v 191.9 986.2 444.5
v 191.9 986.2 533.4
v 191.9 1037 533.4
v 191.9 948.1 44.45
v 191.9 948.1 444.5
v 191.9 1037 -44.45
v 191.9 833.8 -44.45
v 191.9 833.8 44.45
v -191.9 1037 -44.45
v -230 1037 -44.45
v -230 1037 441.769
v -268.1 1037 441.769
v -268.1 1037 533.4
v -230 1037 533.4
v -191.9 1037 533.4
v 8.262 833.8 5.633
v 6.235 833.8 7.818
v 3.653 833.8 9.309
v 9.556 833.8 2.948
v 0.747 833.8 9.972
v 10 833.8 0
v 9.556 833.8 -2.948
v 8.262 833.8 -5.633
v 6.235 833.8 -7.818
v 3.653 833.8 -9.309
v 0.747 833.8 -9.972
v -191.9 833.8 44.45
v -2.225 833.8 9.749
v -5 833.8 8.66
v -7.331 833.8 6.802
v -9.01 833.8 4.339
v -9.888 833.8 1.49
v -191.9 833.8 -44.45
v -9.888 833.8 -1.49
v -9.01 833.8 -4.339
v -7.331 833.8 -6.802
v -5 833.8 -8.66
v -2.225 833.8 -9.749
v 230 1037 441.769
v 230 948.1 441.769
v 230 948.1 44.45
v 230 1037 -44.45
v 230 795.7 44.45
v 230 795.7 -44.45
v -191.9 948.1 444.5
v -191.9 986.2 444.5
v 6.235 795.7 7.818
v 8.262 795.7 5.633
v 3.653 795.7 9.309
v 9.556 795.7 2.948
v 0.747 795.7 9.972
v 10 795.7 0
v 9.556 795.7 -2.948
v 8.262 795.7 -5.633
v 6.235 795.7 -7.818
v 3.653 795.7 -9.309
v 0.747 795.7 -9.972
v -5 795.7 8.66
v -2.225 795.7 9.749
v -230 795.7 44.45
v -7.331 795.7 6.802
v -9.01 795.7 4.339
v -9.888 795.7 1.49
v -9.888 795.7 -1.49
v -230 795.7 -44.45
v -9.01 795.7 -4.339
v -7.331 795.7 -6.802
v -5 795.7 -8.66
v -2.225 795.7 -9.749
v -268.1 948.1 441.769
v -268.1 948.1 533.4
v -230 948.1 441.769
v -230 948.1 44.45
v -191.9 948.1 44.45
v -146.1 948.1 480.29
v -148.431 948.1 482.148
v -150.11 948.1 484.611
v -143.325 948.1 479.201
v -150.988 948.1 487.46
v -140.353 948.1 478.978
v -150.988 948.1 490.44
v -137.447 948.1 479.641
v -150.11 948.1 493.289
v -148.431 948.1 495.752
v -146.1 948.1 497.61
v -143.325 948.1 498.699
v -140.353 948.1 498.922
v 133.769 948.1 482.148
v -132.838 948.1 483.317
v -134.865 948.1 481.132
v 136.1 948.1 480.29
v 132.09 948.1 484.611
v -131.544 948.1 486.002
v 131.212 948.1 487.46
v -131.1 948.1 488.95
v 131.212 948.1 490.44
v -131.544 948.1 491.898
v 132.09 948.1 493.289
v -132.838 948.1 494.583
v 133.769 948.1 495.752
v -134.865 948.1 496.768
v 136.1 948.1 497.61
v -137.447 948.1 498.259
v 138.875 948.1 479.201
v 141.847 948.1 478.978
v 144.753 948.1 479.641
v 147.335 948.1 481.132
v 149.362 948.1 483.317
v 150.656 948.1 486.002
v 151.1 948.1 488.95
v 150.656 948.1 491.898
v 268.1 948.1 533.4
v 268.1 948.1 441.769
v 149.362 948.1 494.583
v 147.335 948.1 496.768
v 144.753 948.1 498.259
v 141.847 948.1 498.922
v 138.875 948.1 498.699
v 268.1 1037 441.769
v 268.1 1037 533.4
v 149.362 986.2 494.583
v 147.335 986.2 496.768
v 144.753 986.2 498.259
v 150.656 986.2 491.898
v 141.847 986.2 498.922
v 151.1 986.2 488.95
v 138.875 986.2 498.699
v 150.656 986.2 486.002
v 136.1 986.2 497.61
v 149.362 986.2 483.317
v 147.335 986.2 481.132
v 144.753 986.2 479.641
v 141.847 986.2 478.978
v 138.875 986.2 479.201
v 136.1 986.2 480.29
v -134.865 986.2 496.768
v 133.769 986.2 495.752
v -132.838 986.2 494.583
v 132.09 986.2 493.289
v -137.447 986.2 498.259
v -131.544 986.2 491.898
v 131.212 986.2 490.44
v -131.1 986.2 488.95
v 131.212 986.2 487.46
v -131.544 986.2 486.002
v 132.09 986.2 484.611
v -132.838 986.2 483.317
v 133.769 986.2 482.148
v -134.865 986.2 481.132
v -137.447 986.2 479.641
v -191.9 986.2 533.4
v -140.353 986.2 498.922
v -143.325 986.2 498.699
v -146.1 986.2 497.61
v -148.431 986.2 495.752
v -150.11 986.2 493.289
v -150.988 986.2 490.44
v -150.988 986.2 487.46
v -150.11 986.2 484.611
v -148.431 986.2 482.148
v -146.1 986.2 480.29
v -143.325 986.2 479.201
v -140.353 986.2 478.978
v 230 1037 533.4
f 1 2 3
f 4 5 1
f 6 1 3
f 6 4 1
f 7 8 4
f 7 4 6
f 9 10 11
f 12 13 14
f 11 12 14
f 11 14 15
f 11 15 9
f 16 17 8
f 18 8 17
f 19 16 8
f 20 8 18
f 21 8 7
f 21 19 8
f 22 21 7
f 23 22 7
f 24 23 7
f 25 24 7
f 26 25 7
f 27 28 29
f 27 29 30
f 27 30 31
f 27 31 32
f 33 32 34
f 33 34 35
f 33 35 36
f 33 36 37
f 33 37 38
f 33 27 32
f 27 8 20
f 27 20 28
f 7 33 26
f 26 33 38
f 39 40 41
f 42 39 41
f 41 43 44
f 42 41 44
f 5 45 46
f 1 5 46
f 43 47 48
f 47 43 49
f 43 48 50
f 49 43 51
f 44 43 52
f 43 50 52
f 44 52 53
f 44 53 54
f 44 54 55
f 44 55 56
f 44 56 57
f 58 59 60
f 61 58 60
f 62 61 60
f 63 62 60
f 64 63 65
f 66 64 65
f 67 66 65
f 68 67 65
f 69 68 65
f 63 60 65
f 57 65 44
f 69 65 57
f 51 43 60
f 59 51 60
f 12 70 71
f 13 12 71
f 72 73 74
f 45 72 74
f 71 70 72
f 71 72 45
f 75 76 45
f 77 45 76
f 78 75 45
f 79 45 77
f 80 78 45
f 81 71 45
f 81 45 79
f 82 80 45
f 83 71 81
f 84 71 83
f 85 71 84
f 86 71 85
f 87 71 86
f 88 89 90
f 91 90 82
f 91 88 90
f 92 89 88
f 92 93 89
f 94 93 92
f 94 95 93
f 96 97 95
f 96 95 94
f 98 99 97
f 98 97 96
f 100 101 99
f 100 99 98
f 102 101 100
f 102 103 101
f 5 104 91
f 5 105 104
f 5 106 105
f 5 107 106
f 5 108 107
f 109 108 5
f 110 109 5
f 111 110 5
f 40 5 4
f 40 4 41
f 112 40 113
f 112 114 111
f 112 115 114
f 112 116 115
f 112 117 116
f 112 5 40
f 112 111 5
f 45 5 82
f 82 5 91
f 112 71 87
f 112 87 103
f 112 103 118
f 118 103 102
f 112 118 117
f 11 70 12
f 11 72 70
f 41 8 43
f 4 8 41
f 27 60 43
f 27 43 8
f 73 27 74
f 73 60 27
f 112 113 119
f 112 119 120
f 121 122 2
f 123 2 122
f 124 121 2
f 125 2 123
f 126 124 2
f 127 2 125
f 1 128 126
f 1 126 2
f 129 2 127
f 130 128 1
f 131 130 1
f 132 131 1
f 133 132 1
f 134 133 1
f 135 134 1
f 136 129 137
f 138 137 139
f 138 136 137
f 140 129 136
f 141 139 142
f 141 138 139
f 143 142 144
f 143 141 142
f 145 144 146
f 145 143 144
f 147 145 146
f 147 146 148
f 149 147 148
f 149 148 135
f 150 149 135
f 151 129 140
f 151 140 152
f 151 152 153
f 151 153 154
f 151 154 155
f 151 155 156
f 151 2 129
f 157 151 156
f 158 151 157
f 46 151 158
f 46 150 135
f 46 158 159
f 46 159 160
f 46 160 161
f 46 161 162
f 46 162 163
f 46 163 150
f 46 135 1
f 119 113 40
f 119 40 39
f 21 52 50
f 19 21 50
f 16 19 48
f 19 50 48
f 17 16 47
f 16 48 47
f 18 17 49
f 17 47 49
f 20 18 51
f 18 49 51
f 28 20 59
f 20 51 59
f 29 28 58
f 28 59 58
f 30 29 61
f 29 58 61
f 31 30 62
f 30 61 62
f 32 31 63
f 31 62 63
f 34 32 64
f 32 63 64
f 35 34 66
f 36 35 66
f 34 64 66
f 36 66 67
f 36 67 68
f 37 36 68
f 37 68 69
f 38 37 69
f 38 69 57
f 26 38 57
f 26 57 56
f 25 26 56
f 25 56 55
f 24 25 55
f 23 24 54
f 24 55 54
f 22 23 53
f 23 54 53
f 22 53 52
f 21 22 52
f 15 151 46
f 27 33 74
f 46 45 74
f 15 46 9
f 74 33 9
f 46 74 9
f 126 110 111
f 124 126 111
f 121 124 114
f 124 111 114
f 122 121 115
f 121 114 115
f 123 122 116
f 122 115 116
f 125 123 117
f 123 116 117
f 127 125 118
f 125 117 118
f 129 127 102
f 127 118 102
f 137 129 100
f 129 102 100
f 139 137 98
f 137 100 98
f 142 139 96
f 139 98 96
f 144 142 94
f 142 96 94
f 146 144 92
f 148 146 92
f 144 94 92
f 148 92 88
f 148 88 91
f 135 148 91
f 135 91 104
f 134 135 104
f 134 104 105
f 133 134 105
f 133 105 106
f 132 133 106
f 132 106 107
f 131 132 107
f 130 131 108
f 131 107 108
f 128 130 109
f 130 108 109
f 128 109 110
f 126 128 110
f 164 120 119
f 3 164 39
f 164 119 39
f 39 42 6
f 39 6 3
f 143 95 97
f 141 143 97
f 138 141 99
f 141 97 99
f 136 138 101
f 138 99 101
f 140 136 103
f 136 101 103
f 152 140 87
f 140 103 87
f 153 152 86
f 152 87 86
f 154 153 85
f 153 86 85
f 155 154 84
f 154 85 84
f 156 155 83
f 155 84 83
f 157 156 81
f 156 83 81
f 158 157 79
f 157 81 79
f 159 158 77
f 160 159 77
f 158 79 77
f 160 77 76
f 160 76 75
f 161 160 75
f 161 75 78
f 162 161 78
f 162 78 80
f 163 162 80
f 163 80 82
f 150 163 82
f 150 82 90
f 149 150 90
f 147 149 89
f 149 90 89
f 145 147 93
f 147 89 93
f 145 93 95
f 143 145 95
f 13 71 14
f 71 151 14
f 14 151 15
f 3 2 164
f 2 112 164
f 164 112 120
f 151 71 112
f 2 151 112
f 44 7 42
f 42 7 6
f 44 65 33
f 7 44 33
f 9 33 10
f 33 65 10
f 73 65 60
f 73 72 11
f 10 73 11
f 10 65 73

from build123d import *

# Parameters (mm, degrees)
SKETCH1_W                = 460
SKETCH1_H                = 88.9
BOSS_EXTRUDE1_DEPTH      = 38.1
SKETCH2_W                = 38.1
SKETCH2_H                = 88.9
BOSS_EXTRUDE2_DEPTH      = 910
SKETCH3_W                = 38.1
SKETCH3_H                = 88.9
BOSS_EXTRUDE3_DEPTH      = 577.85
SKETCH4_W                = 38.1
SKETCH4_H                = 91.631294093
BOSS_EXTRUDE4_DEPTH      = 615
BOSS_EXTRUDE4_DEPTH_BACK = 88.9
SKETCH5_W                = 91.631294093
SKETCH5_H                = 38.1
BOSS_EXTRUDE5_DEPTH      = 460
SKETCH7_W                = 460
SKETCH7_H                = 424.5
SKETCH7_W_2              = 38.1
SKETCH7_H_2              = 152.4
CUT_EXTRUDE1_DEPTH       = 577.85
SKETCH8_W                = 88.9
SKETCH8_H                = 38.1
BOSS_EXTRUDE6_DEPTH      = 383.8
SKETCH10_R               = 10
CUT_EXTRUDE2_DEPTH       = 38.1
SKETCH9_R                = 10
CUT_EXTRUDE3_DEPTH       = 38.1


with BuildPart() as part:
    # Sketch1 → Boss-Extrude1 (new body)
    with BuildSketch(Plane(origin=(0, 0, 0), x_dir=(1, 0, 0), z_dir=(0, 1, 0))):
        Rectangle(SKETCH1_W, SKETCH1_H)
    extrude(amount=BOSS_EXTRUDE1_DEPTH)

    # Sketch2 → Boss-Extrude2 (add)
    with BuildSketch(Plane(origin=(0, 38.1, 0), x_dir=(1, 0, 0), z_dir=(0, 1, 0))):
        with Locations((-210.95, 0)):
            Rectangle(SKETCH2_W, SKETCH2_H)
        with Locations((210.95, 0)):
            Rectangle(SKETCH2_W, SKETCH2_H)
    extrude(amount=BOSS_EXTRUDE2_DEPTH)

    # Sketch3 → Boss-Extrude3 (add)
    with BuildSketch(Plane(origin=(0, 0, -44.45), x_dir=(-1, 0, 0), z_dir=(0, 0, -1))):
        with Locations((210.95, 992.55)):
            Rectangle(SKETCH3_W, SKETCH3_H)
        with Locations((-210.95, 992.55)):
            Rectangle(SKETCH3_W, SKETCH3_H)
    extrude(amount=-BOSS_EXTRUDE3_DEPTH)

    # Sketch4 → Boss-Extrude4 (add, two sides)
    with BuildSketch(Plane.XZ.offset(-948.1)) as boss_extrude4_sk:
        with Locations((-249.05, 487.584352954)):
            Rectangle(SKETCH4_W, SKETCH4_H)
        with Locations((249.05, 487.584352954)):
            Rectangle(SKETCH4_W, SKETCH4_H)
    extrude(amount=BOSS_EXTRUDE4_DEPTH)
    extrude(boss_extrude4_sk.sketch, amount=-BOSS_EXTRUDE4_DEPTH_BACK)

    # Sketch5 → Boss-Extrude5 (add)
    with BuildSketch(Plane.ZY.offset(-230)):
        with Locations((487.584352954, 352.15)):
            Rectangle(SKETCH5_W, SKETCH5_H)
    extrude(amount=BOSS_EXTRUDE5_DEPTH)

    # Sketch7 → Cut-Extrude1 (cut)
    with BuildSketch(Plane.XY.offset(533.4)):
        with Locations((0, 583.45)):
            Rectangle(SKETCH7_W, SKETCH7_H)
        Polygon((268.1, -246.273106328), (268.1, 333.1), (-268.1, 333.1), (-268.1, 795.7), (-577.367310112, 795.7), (-577.367310112, -246.273106328), align=None)
        Polygon((268.1, 333.1), (268.1, 795.7), (230, 795.7), (230, 371.2), (-230, 371.2), (-230, 795.7), (-268.1, 795.7), (-268.1, 333.1), align=None)
        with Locations((249.05, 871.9)):
            Rectangle(SKETCH7_W_2, SKETCH7_H_2)
        with Locations((-249.05, 871.9)):
            Rectangle(SKETCH7_W_2, SKETCH7_H_2)
    extrude(amount=-CUT_EXTRUDE1_DEPTH, mode=Mode.SUBTRACT)

    # Sketch8 → Boss-Extrude6 (add)
    with BuildSketch(Plane(origin=(-191.9, 0, 0), x_dir=(0, 0, -1), z_dir=(1, 0, 0))):
        with Locations((0, 814.75)):
            Rectangle(SKETCH8_W, SKETCH8_H)
        with Locations((-488.95, 967.15)):
            Rectangle(SKETCH8_W, SKETCH8_H)
    extrude(amount=BOSS_EXTRUDE6_DEPTH)

    # Sketch10 → Cut-Extrude2 (cut)
    with BuildSketch(Plane.XZ.offset(-948.1)):
        with Locations((-141.1, 488.95)):
            Circle(SKETCH10_R)
        with Locations((141.1, 488.95)):
            Circle(SKETCH10_R)
    extrude(amount=-CUT_EXTRUDE2_DEPTH, mode=Mode.SUBTRACT)

    # Sketch9 → Cut-Extrude3 (cut)
    with BuildSketch(Plane.XZ.offset(-795.7)):
        Circle(SKETCH9_R)
    extrude(amount=-CUT_EXTRUDE3_DEPTH, mode=Mode.SUBTRACT)


solid = part.part
